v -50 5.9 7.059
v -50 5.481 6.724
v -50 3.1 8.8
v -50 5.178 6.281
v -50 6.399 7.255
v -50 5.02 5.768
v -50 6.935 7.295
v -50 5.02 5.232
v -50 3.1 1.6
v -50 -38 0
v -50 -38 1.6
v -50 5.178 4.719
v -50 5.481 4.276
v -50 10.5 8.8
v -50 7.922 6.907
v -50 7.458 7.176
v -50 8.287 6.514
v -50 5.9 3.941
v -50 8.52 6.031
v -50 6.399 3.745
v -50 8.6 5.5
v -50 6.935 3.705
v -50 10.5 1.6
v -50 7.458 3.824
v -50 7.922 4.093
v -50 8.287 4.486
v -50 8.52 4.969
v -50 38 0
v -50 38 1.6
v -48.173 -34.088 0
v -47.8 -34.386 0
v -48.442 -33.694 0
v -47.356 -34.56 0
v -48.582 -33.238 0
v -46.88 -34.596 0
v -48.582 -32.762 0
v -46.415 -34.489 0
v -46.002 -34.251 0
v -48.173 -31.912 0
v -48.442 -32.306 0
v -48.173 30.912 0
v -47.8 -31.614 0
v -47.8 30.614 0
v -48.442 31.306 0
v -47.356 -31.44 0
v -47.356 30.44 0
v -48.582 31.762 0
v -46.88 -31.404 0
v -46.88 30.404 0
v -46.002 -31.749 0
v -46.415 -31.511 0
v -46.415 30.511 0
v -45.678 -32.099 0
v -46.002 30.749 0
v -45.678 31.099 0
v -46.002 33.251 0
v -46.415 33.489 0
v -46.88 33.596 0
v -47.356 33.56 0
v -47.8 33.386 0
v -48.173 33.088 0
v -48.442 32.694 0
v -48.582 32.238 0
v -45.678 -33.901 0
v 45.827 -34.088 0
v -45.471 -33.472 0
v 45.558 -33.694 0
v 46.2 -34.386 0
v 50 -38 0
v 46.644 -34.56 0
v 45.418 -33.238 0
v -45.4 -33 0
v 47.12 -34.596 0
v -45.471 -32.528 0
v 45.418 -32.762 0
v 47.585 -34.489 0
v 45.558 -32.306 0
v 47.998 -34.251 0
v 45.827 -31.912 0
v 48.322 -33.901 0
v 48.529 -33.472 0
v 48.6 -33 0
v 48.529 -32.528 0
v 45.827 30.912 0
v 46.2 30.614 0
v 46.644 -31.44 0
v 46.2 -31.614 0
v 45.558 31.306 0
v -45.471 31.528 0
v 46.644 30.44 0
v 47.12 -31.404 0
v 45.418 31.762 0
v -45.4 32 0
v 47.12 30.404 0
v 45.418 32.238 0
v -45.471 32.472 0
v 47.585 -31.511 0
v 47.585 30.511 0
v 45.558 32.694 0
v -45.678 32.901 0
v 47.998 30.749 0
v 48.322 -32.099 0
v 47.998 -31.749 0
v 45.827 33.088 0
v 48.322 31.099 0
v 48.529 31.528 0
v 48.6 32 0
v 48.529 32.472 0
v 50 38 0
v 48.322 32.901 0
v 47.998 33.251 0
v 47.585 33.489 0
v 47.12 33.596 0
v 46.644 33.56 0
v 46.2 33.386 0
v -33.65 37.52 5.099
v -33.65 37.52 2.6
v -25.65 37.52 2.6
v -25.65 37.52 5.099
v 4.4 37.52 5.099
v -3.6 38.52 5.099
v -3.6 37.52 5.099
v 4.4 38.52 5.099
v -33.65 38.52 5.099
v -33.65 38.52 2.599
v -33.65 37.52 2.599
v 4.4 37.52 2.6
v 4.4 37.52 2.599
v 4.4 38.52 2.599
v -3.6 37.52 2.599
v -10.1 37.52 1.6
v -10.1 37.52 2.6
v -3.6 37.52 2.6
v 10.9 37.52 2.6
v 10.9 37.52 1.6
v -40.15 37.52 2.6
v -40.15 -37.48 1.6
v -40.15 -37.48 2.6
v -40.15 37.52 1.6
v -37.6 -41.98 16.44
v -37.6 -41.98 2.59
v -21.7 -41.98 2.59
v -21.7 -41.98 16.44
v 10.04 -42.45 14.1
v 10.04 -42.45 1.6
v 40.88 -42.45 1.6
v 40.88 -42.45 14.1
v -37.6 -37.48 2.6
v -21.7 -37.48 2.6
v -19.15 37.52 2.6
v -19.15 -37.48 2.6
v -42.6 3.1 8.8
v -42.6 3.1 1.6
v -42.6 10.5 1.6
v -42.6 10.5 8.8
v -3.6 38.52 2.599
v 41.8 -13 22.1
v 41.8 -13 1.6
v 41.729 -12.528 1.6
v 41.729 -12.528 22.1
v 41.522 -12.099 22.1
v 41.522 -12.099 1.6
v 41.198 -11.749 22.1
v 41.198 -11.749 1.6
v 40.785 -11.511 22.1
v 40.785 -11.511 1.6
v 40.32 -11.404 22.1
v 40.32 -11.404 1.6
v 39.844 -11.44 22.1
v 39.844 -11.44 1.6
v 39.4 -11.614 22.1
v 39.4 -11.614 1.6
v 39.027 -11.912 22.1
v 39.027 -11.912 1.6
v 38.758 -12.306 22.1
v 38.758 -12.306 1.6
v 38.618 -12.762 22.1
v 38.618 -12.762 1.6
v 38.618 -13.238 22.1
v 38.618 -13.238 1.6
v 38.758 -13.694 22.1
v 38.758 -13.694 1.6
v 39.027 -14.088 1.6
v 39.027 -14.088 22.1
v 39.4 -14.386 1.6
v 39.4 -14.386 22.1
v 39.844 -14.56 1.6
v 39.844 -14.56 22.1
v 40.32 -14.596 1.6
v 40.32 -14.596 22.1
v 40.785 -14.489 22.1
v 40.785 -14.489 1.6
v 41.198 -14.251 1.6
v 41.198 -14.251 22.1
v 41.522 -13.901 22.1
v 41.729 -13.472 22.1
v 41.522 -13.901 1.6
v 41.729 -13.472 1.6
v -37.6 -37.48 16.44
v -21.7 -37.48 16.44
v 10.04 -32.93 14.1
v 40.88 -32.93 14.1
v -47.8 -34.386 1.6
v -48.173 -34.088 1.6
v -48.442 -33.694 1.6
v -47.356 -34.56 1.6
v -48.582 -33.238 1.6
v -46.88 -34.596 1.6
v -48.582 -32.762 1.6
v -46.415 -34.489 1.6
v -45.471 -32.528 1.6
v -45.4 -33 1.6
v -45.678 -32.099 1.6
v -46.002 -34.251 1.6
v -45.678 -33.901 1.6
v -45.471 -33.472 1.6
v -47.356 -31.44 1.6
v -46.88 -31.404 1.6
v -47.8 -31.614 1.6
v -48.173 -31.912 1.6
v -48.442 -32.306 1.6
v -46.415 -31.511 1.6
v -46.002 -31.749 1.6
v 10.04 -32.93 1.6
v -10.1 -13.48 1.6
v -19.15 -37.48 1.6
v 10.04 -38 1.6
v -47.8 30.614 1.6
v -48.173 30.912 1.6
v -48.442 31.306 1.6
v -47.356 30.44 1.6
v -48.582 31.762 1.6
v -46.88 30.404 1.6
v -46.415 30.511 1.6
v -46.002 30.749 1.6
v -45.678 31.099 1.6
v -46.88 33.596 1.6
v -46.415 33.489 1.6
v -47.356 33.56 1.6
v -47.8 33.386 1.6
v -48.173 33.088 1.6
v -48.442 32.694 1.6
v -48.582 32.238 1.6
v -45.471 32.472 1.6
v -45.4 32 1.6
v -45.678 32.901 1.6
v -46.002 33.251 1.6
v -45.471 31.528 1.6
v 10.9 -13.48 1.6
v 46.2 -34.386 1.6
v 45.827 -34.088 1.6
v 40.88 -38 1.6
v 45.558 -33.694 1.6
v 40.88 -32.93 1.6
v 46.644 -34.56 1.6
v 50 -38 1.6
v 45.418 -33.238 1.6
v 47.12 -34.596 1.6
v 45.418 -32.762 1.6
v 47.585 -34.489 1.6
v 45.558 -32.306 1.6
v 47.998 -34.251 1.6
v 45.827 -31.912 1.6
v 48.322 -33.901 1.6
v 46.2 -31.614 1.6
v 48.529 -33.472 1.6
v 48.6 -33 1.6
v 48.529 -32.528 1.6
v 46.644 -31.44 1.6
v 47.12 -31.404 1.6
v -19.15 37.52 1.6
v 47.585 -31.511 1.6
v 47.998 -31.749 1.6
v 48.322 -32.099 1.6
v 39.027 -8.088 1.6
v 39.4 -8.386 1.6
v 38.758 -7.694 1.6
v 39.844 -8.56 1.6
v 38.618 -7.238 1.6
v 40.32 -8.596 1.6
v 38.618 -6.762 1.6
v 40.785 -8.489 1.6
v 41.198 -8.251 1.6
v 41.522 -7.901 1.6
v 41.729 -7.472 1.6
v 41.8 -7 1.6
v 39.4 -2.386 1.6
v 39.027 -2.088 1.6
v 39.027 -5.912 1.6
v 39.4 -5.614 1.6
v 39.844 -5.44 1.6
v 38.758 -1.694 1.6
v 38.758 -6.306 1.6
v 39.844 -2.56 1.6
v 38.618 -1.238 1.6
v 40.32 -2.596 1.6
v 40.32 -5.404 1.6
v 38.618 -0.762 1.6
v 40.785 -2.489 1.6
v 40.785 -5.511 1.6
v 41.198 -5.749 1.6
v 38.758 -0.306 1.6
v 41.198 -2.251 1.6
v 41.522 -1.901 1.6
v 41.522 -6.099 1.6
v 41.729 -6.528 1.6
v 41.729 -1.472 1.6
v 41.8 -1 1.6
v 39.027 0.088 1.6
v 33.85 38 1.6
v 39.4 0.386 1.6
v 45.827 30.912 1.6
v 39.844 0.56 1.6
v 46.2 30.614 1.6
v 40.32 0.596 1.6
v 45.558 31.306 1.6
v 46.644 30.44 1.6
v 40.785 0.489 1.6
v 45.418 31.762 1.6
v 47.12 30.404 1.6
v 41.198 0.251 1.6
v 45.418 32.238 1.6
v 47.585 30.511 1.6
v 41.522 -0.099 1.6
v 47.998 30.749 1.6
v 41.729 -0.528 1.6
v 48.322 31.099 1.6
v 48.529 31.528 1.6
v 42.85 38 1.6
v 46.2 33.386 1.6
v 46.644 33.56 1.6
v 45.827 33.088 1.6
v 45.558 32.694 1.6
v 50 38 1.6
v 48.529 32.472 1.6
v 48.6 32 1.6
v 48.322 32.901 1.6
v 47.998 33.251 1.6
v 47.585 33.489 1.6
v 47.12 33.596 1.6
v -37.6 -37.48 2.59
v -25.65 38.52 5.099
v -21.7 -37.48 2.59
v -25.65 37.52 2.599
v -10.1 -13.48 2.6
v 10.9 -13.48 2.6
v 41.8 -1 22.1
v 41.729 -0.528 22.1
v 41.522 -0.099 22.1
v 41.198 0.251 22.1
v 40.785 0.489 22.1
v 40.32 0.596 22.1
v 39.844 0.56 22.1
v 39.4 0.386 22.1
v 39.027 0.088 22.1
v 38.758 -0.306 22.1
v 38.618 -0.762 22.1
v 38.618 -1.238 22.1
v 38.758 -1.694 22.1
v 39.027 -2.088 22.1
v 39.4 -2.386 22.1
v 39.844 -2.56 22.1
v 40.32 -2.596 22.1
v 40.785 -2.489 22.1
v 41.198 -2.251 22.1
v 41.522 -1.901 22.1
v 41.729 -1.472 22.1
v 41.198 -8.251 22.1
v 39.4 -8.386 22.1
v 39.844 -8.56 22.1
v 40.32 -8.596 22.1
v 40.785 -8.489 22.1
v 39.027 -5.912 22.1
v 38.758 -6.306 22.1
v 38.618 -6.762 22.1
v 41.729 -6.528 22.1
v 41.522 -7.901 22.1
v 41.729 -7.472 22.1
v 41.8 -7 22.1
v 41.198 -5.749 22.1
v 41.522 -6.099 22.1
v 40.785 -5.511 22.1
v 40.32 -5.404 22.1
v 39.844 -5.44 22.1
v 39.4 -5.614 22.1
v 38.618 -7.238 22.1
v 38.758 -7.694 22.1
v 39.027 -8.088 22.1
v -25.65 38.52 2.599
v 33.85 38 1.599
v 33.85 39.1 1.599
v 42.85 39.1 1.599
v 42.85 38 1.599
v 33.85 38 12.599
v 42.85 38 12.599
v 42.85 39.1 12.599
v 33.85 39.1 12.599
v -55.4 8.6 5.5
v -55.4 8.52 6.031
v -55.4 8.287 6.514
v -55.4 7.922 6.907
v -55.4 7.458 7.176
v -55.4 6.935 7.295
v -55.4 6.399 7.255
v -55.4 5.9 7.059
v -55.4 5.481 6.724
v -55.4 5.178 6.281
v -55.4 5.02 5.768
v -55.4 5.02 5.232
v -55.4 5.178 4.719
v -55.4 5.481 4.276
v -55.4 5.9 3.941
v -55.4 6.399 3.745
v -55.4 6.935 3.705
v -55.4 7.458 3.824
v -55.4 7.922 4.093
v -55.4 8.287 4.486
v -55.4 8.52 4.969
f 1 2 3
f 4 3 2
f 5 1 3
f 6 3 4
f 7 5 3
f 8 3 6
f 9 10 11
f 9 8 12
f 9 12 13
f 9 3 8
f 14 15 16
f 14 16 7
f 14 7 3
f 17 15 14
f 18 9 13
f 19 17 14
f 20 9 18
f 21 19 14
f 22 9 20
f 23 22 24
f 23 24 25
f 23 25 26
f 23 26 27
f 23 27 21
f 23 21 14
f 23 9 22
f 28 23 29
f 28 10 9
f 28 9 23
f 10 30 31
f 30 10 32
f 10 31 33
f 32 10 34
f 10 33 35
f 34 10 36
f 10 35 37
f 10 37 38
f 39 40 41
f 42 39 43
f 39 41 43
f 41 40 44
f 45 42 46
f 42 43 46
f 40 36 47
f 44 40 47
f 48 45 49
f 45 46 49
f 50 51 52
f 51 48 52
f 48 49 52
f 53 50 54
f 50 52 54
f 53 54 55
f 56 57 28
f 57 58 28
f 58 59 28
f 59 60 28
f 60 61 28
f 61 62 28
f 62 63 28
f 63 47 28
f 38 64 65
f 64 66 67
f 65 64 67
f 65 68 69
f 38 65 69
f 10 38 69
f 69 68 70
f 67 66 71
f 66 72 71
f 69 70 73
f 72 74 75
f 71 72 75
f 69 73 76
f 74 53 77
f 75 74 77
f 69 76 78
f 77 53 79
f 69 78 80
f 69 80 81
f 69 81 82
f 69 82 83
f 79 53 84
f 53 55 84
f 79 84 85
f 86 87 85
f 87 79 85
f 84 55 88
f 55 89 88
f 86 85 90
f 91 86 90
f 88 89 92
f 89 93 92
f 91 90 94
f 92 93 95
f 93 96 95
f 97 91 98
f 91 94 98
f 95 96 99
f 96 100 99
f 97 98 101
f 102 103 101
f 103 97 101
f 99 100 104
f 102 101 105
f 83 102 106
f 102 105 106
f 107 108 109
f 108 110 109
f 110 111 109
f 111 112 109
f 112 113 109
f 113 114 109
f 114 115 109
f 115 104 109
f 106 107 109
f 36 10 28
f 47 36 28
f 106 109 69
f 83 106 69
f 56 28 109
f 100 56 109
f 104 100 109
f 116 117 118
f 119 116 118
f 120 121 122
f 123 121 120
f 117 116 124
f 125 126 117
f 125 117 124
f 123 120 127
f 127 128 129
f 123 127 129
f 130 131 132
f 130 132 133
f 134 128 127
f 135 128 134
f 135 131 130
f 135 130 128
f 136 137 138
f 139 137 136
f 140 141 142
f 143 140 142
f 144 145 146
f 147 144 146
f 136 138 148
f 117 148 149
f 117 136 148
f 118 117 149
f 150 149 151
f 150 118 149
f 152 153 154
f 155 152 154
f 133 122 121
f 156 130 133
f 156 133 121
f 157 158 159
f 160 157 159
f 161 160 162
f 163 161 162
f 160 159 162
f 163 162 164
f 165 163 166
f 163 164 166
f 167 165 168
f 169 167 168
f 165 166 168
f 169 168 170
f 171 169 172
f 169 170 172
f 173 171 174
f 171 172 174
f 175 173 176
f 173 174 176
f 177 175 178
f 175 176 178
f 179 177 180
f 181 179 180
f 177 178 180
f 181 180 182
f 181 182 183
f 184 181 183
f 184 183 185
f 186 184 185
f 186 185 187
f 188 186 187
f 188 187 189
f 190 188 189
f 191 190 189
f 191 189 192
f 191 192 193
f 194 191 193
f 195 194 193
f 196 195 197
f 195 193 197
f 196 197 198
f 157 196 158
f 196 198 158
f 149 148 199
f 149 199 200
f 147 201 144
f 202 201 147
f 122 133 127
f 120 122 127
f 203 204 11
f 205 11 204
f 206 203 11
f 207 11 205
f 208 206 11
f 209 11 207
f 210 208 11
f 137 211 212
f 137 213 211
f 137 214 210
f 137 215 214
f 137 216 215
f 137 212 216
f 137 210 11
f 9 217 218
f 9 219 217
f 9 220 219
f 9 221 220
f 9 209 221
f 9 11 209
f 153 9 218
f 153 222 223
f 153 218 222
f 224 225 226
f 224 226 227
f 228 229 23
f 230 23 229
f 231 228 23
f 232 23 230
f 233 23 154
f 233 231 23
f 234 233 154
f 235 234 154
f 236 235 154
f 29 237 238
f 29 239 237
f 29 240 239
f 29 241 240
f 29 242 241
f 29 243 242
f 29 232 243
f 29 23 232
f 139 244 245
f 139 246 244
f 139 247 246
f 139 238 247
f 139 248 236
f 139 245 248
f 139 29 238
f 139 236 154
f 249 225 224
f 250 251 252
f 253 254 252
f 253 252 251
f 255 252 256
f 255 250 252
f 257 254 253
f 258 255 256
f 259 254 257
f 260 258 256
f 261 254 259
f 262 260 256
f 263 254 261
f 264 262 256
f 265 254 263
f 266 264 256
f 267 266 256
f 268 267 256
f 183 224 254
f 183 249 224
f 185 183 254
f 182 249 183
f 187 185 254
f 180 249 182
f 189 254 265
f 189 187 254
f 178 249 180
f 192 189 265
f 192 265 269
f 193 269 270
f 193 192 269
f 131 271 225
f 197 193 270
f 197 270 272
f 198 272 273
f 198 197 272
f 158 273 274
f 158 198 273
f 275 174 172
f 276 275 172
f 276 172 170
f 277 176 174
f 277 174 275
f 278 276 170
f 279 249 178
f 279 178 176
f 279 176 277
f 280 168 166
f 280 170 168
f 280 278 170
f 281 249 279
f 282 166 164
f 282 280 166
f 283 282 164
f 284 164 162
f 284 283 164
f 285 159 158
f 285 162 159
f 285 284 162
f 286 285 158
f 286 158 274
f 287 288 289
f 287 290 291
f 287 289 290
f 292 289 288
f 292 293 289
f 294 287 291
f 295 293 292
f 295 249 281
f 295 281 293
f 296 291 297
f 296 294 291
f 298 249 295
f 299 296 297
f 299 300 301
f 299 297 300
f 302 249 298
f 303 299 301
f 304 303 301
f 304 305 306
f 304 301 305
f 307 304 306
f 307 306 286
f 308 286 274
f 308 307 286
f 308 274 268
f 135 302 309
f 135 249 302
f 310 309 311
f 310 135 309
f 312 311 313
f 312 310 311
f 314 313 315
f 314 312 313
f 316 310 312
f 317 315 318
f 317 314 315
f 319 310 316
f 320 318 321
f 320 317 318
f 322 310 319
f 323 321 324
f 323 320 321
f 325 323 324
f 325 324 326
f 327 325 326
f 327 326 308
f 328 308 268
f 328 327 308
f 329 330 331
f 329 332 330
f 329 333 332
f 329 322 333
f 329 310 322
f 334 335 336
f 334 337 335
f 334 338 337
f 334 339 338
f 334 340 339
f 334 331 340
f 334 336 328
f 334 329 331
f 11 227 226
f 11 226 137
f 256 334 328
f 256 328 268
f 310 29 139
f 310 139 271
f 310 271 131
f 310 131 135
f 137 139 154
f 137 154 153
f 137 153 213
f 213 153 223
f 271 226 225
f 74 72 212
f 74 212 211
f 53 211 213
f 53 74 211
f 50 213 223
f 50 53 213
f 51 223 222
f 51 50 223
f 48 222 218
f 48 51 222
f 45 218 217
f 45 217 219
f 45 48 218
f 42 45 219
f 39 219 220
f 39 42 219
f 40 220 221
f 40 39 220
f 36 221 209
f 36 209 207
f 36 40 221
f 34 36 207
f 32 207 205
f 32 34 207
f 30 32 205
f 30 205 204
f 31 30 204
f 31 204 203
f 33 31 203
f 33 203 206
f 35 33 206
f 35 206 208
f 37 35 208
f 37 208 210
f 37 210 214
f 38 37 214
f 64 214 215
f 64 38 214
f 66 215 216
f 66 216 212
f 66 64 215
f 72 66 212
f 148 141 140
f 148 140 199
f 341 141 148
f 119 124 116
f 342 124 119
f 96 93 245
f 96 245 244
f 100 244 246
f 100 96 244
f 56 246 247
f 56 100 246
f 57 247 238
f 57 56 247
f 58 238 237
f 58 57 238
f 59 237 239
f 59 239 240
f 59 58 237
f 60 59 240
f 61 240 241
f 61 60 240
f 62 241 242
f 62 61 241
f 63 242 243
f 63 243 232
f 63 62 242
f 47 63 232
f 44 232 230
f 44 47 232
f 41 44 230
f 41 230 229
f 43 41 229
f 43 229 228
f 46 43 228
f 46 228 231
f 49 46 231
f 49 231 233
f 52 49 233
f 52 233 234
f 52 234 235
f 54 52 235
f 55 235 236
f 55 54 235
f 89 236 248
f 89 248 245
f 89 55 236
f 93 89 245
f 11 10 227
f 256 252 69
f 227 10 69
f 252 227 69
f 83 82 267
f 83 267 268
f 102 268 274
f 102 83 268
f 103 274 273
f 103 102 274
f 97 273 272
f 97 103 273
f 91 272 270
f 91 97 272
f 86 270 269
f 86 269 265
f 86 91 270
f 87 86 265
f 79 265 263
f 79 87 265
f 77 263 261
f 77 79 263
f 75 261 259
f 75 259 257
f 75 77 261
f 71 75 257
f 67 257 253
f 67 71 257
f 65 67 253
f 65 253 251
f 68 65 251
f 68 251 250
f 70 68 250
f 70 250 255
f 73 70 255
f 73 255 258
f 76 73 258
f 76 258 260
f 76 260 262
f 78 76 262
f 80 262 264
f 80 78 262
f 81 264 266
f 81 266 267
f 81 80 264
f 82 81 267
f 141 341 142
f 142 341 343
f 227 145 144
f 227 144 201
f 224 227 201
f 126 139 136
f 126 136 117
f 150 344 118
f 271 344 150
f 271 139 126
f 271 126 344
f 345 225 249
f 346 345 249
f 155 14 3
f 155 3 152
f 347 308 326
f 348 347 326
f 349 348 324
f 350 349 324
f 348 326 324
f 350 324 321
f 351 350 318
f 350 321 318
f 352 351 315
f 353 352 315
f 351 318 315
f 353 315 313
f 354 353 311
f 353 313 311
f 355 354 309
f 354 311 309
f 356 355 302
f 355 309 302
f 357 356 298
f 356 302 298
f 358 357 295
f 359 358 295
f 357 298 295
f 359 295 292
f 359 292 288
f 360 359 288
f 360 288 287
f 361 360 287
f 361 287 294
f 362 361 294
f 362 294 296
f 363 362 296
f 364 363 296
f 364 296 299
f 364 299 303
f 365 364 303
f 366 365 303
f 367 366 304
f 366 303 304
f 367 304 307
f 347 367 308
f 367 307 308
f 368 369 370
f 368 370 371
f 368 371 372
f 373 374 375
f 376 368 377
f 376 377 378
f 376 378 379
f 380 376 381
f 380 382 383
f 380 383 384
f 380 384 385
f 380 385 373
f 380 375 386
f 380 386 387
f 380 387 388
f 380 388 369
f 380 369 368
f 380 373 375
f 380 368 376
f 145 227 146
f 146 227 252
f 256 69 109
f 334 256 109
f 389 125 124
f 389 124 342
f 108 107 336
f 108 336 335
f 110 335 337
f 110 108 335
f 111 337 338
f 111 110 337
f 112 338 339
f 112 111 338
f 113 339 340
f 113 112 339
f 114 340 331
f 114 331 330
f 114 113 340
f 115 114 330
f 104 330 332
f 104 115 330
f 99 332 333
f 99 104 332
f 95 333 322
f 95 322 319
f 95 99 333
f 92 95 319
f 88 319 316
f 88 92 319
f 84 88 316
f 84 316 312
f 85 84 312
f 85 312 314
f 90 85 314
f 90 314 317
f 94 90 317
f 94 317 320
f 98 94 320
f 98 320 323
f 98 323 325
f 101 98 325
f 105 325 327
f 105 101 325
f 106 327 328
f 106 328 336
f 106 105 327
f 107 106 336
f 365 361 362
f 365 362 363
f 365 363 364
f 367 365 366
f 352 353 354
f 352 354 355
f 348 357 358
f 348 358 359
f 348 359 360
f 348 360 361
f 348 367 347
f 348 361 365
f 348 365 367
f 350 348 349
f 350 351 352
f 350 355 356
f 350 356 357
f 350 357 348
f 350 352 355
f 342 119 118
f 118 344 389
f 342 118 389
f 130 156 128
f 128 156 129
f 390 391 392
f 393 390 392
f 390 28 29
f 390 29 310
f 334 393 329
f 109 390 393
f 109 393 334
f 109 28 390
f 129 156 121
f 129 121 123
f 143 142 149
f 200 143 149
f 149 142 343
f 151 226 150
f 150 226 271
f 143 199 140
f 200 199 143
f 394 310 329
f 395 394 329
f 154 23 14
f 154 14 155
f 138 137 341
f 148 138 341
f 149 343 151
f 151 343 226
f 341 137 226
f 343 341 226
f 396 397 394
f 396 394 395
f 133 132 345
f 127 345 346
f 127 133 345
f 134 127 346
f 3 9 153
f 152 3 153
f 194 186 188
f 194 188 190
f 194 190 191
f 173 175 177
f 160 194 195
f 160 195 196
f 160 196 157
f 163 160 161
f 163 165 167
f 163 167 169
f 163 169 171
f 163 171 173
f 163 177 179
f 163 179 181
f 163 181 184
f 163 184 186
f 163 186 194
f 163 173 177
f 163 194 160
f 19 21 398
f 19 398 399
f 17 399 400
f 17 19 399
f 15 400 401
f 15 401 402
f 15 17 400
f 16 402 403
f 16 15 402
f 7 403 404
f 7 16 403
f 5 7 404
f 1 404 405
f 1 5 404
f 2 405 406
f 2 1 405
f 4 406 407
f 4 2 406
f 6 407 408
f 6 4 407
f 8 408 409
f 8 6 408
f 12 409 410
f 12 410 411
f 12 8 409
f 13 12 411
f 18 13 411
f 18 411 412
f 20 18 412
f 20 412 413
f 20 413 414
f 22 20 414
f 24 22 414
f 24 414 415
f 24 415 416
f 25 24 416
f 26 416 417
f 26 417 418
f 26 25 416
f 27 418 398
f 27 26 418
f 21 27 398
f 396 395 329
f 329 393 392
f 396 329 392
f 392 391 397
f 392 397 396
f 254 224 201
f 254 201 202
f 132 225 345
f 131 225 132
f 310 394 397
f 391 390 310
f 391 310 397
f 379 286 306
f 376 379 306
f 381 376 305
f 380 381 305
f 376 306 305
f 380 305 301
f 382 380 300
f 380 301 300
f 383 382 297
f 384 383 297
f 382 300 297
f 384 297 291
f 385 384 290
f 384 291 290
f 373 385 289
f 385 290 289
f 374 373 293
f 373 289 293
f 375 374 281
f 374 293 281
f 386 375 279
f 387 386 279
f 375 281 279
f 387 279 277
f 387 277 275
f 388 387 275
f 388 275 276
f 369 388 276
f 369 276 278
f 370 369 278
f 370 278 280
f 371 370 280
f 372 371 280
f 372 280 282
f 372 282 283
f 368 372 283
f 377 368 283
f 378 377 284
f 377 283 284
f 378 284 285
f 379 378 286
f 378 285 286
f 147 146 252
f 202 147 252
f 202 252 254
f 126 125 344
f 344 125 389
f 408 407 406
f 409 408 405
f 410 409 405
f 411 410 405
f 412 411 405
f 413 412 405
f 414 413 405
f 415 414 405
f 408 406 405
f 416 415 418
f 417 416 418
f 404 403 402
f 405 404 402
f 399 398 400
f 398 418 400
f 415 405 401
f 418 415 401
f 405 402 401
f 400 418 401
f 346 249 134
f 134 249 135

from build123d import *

# Parameters (mm, degrees)
SKETCH_W     = 100
SKETCH_H     = 76
SKETCH_R     = 1.6
PAD_DEPTH    = 1.6
SKETCH001_W  = 21
SKETCH001_H  = 75
PAD001_DEPTH = 1
SKETCH002_W  = 15.9
SKETCH002_H  = 4.5
PAD002_DEPTH = 13.85
SKETCH003_W  = 8
SKETCH003_H  = 1
PAD003_DEPTH = 2.5
SKETCH004_W  = 30.84
SKETCH004_H  = 9.52
PAD004_DEPTH = 12.5
SKETCH005_W  = 21
SKETCH005_H  = 51
PAD005_DEPTH = 1
SKETCH006_W  = 8
SKETCH006_H  = 1
PAD006_DEPTH = 2.5
SKETCH007_W  = 9
SKETCH007_H  = 1.1
PAD007_DEPTH = 11
SKETCH008_W  = 7.4
SKETCH008_H  = 7.4
PAD008_DEPTH = 7.2
SKETCH009_R  = 1.8
PAD009_DEPTH = 5.4
SKETCH010_R  = 1.6
PAD010_DEPTH = 20.5


with BuildPart() as part:
    # Sketch → Pad (new body)
    with BuildSketch(Plane.XY):
        Rectangle(SKETCH_W, SKETCH_H)
        with Locations((-47, 32)):
            Circle(SKETCH_R, mode=Mode.SUBTRACT)
        with Locations((47, 32)):
            Circle(SKETCH_R, mode=Mode.SUBTRACT)
        with Locations((-47, -33)):
            Circle(SKETCH_R, mode=Mode.SUBTRACT)
        with Locations((47, -33)):
            Circle(SKETCH_R, mode=Mode.SUBTRACT)
    extrude(amount=PAD_DEPTH)

    # Sketch001 → Pad001 (join)
    with BuildSketch(Plane.XY.offset(1.6)):
        with Locations((-29.65, 0.02)):
            Rectangle(SKETCH001_W, SKETCH001_H)
    extrude(amount=PAD001_DEPTH)

    # Sketch002 → Pad002 (join)
    with BuildSketch(Plane.XY.offset(2.59)):
        with Locations((-29.65, -39.73)):
            Rectangle(SKETCH002_W, SKETCH002_H)
    extrude(amount=PAD002_DEPTH)

    # Sketch003 → Pad003 (join)
    with BuildSketch(Plane.XY.offset(2.599)):
        with Locations((-29.65, 38.02)):
            Rectangle(SKETCH003_W, SKETCH003_H)
    extrude(amount=PAD003_DEPTH)

    # Sketch004 → Pad004 (join)
    with BuildSketch(Plane.XY.offset(1.6)):
        with Locations((25.46, -37.69)):
            Rectangle(SKETCH004_W, SKETCH004_H)
    extrude(amount=PAD004_DEPTH)

    # Sketch005 → Pad005 (join)
    with BuildSketch(Plane.XY.offset(1.6)):
        with Locations((0.4, 12.02)):
            Rectangle(SKETCH005_W, SKETCH005_H)
    extrude(amount=PAD005_DEPTH)

    # Sketch006 → Pad006 (join)
    with BuildSketch(Plane.XY.offset(2.599)):
        with Locations((0.4, 38.02)):
            Rectangle(SKETCH006_W, SKETCH006_H)
    extrude(amount=PAD006_DEPTH)

    # Sketch007 → Pad007 (join)
    with BuildSketch(Plane.XY.offset(1.599)):
        with Locations((38.35, 38.55)):
            Rectangle(SKETCH007_W, SKETCH007_H)
    extrude(amount=PAD007_DEPTH)

    # Sketch008 → Pad008 (join)
    with BuildSketch(Plane.XY.offset(1.6)):
        with Locations((-46.3, 6.8)):
            Rectangle(SKETCH008_W, SKETCH008_H)
    extrude(amount=PAD008_DEPTH)

    # Sketch009 → Pad009 (join)
    with BuildSketch(Plane.YZ.offset(-50)):
        with Locations((6.8, 5.5)):
            Circle(SKETCH009_R)
    extrude(amount=-PAD009_DEPTH)

    # Sketch010 → Pad010 (join)
    with BuildSketch(Plane.XY.offset(1.6)):
        with Locations((40.2, -1)):
            Circle(SKETCH010_R)
        with Locations((40.2, -7)):
            Circle(SKETCH010_R)
        with Locations((40.2, -13)):
            Circle(SKETCH010_R)
    extrude(amount=PAD010_DEPTH)


solid = part.part
